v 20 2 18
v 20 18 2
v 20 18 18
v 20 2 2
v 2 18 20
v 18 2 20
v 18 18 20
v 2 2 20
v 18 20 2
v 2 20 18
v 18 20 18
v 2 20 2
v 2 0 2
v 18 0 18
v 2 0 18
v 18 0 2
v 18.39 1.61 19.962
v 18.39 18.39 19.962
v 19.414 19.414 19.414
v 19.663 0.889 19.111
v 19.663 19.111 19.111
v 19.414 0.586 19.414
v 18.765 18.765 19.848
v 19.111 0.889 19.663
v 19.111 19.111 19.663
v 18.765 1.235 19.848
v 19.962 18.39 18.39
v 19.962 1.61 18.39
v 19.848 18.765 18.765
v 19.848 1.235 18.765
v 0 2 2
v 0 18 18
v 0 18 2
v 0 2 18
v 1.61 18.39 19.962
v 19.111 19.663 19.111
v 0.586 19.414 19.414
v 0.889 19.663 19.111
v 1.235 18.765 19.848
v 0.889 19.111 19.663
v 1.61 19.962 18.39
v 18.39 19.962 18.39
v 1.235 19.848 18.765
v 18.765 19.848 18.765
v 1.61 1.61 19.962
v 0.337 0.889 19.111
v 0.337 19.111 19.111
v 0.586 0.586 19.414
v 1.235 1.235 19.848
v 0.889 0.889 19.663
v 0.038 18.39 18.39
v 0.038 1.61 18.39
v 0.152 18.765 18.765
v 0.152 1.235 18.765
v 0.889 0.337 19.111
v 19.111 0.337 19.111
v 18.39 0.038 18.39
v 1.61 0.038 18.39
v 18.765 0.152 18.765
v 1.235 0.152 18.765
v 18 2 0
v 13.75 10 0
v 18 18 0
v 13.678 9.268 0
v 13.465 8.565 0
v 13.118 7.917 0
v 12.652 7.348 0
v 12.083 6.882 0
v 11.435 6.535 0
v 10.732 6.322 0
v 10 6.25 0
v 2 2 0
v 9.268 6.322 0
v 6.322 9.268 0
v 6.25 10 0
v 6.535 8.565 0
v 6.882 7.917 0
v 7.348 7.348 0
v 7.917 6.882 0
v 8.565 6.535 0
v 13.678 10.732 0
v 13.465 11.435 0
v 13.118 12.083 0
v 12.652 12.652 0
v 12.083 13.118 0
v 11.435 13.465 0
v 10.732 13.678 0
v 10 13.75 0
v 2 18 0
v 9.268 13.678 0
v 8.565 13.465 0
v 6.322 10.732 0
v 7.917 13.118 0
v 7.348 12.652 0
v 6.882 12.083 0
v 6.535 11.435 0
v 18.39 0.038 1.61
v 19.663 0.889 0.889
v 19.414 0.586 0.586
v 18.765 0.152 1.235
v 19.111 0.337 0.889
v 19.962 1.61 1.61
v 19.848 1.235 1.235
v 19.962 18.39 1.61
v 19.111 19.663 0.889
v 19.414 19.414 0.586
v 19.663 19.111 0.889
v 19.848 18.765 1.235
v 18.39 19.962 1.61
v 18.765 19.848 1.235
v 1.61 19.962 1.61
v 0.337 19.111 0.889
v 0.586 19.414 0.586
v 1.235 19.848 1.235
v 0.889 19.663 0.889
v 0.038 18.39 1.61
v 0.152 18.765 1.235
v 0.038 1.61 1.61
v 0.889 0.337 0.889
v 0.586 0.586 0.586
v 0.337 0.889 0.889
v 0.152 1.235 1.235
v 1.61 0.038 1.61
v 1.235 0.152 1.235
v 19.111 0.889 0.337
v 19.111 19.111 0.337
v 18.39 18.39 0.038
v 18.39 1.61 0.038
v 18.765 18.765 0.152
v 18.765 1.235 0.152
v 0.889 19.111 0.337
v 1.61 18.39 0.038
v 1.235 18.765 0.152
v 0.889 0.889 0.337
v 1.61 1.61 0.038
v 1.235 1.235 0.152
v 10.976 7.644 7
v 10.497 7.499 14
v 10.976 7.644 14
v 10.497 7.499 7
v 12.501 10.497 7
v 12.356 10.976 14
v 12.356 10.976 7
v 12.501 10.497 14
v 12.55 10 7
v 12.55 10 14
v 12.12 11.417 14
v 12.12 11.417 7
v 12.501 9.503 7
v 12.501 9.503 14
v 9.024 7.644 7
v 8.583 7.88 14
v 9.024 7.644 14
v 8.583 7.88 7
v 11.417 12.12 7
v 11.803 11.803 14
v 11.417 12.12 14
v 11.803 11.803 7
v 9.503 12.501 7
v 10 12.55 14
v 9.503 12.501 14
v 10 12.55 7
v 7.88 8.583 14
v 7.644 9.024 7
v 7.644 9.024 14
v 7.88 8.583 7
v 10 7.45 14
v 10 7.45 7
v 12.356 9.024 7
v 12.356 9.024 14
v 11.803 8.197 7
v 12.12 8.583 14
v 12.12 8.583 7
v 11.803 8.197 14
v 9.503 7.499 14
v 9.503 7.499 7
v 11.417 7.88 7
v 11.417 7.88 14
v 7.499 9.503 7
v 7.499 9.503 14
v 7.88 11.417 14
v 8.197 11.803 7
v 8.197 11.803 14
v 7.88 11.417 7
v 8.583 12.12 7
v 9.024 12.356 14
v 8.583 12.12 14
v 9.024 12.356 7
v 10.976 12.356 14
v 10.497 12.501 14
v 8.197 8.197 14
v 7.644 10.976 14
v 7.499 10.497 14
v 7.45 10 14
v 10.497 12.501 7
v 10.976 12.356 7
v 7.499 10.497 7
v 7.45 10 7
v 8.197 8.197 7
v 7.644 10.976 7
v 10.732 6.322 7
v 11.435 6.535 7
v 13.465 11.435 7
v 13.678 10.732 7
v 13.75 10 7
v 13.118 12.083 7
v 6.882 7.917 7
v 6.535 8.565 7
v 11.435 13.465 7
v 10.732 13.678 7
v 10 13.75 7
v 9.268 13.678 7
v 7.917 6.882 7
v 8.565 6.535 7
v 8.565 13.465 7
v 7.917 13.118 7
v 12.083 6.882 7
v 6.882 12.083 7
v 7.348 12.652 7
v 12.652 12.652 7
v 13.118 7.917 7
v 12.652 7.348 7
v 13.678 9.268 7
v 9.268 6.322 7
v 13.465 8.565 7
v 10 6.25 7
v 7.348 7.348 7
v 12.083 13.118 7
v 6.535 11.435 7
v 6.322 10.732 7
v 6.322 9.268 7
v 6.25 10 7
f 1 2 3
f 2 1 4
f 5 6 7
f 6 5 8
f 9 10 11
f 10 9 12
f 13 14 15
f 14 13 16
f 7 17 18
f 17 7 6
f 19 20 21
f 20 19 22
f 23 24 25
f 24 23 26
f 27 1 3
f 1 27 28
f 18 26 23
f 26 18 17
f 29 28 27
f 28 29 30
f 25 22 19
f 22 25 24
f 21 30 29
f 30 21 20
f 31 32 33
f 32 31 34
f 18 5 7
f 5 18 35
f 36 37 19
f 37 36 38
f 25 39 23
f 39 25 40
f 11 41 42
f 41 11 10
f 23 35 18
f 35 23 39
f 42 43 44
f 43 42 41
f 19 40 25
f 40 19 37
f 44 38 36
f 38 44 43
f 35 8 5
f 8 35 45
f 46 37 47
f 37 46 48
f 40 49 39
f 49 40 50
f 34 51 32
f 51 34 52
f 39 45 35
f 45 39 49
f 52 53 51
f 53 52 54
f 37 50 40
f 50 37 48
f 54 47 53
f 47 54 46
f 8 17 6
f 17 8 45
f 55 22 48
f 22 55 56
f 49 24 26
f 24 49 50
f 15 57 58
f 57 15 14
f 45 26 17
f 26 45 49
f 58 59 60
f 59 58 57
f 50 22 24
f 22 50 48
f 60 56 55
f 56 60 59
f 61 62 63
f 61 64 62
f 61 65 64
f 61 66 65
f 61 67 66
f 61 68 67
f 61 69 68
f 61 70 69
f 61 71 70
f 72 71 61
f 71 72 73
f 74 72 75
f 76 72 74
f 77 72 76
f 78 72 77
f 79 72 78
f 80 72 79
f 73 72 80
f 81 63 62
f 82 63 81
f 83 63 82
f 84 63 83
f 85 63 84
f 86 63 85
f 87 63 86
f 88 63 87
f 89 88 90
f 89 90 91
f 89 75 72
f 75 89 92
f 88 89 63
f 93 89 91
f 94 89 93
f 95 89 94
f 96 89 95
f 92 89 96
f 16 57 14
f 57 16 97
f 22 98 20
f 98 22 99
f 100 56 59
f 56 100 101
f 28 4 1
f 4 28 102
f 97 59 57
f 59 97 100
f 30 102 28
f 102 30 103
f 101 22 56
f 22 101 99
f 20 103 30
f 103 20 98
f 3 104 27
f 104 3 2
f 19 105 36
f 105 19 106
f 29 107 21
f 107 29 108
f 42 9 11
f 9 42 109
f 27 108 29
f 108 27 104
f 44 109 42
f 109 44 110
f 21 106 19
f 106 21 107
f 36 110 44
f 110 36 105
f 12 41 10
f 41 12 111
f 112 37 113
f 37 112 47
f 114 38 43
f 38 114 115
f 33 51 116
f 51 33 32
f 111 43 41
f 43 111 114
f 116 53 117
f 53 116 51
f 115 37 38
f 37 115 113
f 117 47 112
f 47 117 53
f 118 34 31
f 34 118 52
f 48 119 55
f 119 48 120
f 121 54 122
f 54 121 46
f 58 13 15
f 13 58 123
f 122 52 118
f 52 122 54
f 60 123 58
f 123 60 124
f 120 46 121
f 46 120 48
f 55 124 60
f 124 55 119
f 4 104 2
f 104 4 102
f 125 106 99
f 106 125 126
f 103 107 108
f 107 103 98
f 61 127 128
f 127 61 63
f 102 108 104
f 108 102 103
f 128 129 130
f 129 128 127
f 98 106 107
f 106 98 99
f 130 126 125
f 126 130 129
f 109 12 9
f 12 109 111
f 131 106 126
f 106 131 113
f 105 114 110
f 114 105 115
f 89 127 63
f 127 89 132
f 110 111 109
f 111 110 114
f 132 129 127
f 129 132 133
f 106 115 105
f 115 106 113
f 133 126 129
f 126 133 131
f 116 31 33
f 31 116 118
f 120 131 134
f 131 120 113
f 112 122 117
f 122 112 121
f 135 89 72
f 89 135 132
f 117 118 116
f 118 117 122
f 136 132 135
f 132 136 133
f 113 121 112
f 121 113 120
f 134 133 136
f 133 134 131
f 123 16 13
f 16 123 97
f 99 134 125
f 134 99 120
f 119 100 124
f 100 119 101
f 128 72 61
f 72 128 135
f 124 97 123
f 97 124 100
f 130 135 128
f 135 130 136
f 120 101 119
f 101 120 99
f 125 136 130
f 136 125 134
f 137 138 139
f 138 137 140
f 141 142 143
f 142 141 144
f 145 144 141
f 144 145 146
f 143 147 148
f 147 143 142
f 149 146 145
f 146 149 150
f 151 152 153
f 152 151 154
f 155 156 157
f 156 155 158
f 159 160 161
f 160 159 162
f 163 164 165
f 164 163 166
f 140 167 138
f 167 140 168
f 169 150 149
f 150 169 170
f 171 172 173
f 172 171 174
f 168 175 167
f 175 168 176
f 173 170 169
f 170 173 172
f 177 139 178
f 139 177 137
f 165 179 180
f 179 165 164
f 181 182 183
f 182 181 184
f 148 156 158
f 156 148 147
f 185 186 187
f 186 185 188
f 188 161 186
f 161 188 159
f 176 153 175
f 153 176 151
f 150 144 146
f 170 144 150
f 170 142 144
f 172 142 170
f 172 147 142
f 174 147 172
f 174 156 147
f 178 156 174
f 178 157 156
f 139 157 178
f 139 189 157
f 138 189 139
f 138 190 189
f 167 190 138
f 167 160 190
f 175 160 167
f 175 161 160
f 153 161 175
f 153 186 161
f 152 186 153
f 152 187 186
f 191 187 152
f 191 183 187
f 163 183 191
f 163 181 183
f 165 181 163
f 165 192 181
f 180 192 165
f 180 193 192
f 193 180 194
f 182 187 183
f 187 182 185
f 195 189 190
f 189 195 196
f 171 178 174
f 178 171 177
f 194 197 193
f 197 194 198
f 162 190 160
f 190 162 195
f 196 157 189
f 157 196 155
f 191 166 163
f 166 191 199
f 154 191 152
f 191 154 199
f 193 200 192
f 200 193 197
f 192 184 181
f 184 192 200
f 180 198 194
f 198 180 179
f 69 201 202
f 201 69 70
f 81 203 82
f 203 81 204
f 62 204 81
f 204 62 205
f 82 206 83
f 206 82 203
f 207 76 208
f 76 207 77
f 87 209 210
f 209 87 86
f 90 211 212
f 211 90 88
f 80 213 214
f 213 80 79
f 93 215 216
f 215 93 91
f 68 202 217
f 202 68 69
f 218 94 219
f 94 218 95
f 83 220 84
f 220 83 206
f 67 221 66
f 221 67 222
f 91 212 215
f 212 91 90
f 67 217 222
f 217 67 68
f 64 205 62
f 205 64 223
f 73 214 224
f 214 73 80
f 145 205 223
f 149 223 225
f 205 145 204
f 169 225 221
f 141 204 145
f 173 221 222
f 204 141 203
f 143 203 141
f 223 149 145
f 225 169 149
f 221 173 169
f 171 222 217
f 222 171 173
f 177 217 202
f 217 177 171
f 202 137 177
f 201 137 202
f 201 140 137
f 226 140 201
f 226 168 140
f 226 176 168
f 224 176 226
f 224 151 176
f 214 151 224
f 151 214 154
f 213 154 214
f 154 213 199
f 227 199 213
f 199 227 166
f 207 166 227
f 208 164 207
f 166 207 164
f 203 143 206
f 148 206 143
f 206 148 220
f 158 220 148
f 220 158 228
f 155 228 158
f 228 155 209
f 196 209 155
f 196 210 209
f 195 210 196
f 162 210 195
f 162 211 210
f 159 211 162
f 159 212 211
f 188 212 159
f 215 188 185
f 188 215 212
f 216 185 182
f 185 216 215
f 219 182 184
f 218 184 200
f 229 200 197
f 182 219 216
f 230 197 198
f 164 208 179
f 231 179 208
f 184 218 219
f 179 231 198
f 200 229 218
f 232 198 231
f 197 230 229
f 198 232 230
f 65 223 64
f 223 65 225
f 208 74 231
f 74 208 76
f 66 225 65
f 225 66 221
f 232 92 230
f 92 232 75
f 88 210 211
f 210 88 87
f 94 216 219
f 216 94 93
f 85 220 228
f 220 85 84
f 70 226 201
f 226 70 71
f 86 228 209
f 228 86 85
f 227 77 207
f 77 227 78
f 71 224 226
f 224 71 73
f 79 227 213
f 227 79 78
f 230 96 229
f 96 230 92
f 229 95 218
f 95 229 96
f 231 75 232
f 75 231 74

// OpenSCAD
// file: ../libraries/roundcube.scad
module rond_corner(rayon,deep) {
    difference() {
        cube([rayon,deep,rayon]);
        rotate([-90,0,0]) cylinder(deep, r=rayon,$fn=32);
    }
}


module rondcube(rayon,width,deep, height, top=true, bottom=true, side=true) {
    difference() {
        cube([width, deep, height]);
        if (top) {
            translate([width-rayon,0,height-rayon]) rond_corner(rayon,deep);
            translate([width,deep-rayon,height-rayon]) rotate([0,0,90]) rond_corner(rayon,width);
            translate([rayon,deep,height-rayon]) rotate([0,0,180]) rond_corner(rayon,deep);
            translate([0,rayon,height-rayon]) rotate([0,0,270]) rond_corner(rayon,width);
        }
        if (side) {
            translate([width-rayon,rayon,0]) rotate([90,0,0]) rond_corner(rayon,height);
            translate([width-rayon,deep-rayon,0]) rotate([90,0,90]) rond_corner(rayon,height);
            translate([rayon,deep-rayon,0]) rotate([90,0,180]) rond_corner(rayon,height);
            translate([rayon,rayon,0]) rotate([90,0,270]) rond_corner(rayon,height);
        }
        if (bottom) {
            translate([width-rayon,0,rayon]) rotate([0,90,0]) rond_corner(rayon,deep);
            translate([width,deep-rayon,rayon]) rotate([0,90,90]) rond_corner(rayon,width);
            translate([rayon,deep,rayon]) rotate([0,90,180]) rond_corner(rayon,deep);
            translate([0,rayon,rayon]) rotate([0,90,270]) rond_corner(rayon,width);
        }
    }
}

rondcube(2, 30, 20, 15);
// main file
use <../libraries/roundcube.scad>


module led(width) {
    difference() {
        rondcube(2, width, width, width);
        translate([width/2,width/2,0]) cylinder(width/2+4, d=5.1, $fn=32); //led
        translate([width/2,width/2,0]) cylinder(width/2-3, d=7.5, $fn=32); //led
    }
}

led(20);
